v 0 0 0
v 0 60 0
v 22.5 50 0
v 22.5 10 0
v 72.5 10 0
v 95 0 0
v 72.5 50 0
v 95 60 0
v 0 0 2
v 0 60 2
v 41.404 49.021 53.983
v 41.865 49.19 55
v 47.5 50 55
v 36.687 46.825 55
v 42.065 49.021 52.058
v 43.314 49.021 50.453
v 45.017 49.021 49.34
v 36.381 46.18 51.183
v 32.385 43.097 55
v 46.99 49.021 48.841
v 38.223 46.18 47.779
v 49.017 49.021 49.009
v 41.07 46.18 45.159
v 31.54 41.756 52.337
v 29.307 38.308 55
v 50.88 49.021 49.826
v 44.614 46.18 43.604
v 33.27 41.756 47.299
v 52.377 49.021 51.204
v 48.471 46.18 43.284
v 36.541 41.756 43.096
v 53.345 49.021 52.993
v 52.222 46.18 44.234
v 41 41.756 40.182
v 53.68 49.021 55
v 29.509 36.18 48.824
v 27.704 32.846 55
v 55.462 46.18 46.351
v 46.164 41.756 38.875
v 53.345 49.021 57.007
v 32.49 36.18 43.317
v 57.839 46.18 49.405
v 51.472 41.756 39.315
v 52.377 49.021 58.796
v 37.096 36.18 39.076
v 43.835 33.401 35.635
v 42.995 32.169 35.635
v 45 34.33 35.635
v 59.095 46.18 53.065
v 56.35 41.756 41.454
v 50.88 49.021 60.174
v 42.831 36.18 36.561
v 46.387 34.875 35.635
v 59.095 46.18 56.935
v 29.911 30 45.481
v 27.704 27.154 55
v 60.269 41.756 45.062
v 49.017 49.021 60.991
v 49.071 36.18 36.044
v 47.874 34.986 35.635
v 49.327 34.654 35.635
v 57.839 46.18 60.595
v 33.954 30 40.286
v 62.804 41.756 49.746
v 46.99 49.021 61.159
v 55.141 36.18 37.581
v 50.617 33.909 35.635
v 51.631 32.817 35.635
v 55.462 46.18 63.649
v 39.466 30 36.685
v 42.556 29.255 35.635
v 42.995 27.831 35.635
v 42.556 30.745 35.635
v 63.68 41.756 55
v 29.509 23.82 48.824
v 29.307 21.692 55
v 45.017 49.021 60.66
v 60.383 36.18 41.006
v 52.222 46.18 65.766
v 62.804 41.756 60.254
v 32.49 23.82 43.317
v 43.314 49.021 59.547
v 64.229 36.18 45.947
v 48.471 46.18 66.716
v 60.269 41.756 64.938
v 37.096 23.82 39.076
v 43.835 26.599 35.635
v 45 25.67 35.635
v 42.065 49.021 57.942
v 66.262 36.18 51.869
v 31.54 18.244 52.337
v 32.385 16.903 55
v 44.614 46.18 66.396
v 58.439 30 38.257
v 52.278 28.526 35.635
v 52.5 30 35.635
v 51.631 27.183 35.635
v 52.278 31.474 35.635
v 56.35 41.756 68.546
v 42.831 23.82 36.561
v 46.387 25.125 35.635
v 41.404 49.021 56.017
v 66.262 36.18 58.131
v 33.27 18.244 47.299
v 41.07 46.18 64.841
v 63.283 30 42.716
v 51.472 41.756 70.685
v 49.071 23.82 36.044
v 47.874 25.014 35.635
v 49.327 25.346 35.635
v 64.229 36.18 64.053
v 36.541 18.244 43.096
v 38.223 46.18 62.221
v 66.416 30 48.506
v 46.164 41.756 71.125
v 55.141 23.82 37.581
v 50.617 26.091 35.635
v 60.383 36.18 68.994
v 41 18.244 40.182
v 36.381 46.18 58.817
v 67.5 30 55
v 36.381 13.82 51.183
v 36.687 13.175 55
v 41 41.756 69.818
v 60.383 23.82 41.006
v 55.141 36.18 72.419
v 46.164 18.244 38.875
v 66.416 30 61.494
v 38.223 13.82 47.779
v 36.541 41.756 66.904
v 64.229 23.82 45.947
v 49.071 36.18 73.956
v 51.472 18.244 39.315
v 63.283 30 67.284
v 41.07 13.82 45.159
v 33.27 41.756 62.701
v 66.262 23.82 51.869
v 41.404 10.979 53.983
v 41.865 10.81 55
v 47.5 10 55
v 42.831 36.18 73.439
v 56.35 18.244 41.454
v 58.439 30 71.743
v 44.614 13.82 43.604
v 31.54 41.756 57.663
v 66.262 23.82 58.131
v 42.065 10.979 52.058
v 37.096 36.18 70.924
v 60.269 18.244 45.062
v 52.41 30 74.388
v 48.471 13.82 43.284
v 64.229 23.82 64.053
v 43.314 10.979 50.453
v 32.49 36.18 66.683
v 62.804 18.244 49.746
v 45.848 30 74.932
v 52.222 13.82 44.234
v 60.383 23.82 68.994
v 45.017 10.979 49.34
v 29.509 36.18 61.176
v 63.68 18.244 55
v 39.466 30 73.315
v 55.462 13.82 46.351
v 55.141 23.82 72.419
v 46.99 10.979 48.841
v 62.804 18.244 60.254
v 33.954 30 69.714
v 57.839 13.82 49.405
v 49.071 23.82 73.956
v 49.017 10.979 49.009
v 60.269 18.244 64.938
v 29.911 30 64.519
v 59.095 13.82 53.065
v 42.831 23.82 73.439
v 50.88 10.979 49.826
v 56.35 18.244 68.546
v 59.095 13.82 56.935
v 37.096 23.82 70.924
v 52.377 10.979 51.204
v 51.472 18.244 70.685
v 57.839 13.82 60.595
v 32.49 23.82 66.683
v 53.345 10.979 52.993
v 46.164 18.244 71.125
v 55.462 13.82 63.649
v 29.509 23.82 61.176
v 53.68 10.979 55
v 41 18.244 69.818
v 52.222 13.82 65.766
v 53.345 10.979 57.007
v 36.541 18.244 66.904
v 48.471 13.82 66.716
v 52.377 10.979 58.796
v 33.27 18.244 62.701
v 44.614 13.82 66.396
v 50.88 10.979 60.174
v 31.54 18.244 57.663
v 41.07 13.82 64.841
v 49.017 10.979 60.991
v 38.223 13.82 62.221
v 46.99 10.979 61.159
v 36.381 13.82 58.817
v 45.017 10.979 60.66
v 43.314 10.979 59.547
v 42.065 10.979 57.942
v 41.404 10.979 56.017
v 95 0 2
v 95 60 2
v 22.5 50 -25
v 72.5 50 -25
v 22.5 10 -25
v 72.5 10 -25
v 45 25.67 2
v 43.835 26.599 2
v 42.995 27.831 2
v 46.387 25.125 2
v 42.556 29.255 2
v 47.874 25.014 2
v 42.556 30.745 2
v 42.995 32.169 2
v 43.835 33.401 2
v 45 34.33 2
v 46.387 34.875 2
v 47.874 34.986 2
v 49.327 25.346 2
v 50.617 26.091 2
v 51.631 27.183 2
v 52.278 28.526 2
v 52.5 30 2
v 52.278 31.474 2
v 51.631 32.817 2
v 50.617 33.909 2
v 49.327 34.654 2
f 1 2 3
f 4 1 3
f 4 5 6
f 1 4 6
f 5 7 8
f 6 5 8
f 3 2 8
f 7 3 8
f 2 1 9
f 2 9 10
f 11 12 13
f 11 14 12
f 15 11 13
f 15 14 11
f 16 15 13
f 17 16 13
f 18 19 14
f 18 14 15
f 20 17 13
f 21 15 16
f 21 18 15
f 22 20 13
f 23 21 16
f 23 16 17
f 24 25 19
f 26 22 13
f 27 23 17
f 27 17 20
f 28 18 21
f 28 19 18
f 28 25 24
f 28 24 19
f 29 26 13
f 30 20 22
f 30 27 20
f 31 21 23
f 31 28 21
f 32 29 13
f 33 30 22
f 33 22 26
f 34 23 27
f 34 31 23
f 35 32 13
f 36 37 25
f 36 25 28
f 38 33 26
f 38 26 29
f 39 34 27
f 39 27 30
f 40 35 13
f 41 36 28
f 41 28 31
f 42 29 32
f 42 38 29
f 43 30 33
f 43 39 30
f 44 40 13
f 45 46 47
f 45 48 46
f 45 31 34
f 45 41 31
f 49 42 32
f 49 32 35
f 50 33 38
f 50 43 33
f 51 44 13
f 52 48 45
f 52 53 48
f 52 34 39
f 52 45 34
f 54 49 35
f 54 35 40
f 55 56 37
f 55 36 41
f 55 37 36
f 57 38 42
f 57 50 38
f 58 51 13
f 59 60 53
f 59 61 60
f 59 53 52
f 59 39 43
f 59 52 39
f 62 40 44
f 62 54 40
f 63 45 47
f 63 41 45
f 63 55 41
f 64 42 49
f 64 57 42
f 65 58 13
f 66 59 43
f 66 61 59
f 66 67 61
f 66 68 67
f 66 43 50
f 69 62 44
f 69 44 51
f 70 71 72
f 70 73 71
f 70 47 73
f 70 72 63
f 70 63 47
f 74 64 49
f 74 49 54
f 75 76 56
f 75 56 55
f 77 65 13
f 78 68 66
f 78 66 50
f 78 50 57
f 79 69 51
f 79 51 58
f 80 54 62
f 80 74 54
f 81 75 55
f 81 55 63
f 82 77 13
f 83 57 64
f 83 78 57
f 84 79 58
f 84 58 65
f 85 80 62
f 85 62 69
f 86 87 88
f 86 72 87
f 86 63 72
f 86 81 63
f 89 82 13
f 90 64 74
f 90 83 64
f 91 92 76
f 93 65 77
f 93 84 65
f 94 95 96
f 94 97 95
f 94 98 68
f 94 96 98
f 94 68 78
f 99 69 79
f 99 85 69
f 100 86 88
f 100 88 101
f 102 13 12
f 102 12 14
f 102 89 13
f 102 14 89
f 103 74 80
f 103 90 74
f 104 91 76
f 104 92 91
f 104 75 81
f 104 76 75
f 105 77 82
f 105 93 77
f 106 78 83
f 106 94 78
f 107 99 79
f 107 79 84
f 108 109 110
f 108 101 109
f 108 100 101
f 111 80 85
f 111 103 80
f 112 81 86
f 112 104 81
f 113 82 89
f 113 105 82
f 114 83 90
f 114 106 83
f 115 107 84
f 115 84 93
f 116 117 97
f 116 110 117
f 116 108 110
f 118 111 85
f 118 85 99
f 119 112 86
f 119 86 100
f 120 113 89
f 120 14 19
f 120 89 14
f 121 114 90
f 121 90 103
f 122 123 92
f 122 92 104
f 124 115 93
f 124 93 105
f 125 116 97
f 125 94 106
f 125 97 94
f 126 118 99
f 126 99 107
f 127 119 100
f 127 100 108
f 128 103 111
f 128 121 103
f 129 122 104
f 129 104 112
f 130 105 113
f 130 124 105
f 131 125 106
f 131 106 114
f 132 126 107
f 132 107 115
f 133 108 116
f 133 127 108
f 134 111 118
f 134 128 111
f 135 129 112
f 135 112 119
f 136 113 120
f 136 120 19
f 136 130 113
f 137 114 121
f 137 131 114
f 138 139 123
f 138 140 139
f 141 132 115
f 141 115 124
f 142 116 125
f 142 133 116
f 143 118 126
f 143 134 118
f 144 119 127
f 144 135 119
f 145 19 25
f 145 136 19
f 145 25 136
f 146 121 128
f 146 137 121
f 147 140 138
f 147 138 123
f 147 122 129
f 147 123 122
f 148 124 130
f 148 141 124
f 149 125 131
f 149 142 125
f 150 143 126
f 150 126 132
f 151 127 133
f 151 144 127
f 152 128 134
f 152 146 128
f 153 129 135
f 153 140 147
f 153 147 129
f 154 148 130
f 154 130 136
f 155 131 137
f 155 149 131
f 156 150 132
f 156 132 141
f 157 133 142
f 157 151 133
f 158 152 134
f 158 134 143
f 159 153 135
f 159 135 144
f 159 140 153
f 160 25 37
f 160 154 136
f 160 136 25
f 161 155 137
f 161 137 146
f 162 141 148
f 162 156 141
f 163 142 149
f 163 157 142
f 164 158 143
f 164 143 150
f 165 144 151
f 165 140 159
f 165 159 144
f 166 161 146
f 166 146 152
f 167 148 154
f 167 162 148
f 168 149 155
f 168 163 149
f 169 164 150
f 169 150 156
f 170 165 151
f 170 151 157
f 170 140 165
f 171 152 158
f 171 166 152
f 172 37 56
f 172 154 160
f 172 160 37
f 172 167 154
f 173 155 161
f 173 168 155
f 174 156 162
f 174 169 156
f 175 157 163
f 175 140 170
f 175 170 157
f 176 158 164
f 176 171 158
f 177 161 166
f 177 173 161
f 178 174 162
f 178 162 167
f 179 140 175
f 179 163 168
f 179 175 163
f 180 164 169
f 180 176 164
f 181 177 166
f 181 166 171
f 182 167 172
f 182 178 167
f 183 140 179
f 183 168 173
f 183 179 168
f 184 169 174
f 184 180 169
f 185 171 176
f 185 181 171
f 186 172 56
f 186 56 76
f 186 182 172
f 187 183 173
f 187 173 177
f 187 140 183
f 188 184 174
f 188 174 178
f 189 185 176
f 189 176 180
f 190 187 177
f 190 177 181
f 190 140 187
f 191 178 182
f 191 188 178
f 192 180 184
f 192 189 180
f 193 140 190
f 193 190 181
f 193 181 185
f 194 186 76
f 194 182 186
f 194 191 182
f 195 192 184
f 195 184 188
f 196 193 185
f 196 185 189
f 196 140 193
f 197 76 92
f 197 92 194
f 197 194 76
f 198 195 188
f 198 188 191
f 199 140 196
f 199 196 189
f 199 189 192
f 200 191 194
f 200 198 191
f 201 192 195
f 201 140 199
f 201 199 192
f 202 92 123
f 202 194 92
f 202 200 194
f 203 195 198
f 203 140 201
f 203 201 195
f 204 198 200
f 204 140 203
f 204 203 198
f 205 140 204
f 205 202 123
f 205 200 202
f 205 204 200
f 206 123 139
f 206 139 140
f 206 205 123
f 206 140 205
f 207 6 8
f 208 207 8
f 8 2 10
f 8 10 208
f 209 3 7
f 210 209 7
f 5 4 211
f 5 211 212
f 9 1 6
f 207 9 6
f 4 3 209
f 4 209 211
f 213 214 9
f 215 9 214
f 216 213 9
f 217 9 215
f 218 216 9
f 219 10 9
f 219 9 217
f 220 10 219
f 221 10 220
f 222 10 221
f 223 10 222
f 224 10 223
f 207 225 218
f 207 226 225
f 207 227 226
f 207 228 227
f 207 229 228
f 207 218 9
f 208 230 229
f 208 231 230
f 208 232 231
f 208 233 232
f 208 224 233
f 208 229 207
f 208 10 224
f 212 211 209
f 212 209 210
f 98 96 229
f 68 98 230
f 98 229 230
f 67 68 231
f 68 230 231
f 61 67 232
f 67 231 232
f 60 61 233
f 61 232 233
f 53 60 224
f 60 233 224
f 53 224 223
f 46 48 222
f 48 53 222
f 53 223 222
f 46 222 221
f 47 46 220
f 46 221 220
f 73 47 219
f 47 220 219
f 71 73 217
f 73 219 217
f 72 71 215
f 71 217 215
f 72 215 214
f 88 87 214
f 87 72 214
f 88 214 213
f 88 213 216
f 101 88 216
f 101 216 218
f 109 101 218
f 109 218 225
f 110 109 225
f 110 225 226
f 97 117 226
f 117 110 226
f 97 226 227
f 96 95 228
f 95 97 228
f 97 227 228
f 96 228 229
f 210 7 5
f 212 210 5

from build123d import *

# Parameters (mm, degrees)
SKETCH_W     = 95
SKETCH_H     = 60
PAD_DEPTH    = 2
SKETCH001_W  = 50
SKETCH001_H  = 40
PAD001_DEPTH = 25
SKETCH002_R  = 5
PAD002_DEPTH = 53


with BuildPart() as part:
    # Sketch → Pad (new body)
    with BuildSketch(Plane.XY):
        with Locations((47.5, 30)):
            Rectangle(SKETCH_W, SKETCH_H)
    extrude(amount=PAD_DEPTH)

    # Sketch001 (on Face5 of Pad) → Pad001 (join)
    with BuildSketch(Plane(origin=(0, 0, 0), x_dir=(1, 0, 0), z_dir=(0, 0, -1))):
        with Locations((47.5, -30)):
            Rectangle(SKETCH001_W, SKETCH001_H)
    extrude(amount=PAD001_DEPTH)

    # Sketch002 (on Face5 of Pad001) → Pad002 (join)
    with BuildSketch(Plane.XY.offset(2)):
        with Locations((47.5, 30)):
            Circle(SKETCH002_R)
    extrude(amount=PAD002_DEPTH)

    # Sketch003 (on Face13 of Pad002) → Revolution (revolve)
    with BuildSketch(Plane.XY.offset(55)):
        with BuildLine():
            ThreePointArc((47.5, 50), (27.5, 30), (47.5, 10))
            Line((47.5, 50), (47.5, 10))
        make_face()
    revolve(axis=Axis((47.5, 50, 55), (0, -1, 0)))


solid = part.part
